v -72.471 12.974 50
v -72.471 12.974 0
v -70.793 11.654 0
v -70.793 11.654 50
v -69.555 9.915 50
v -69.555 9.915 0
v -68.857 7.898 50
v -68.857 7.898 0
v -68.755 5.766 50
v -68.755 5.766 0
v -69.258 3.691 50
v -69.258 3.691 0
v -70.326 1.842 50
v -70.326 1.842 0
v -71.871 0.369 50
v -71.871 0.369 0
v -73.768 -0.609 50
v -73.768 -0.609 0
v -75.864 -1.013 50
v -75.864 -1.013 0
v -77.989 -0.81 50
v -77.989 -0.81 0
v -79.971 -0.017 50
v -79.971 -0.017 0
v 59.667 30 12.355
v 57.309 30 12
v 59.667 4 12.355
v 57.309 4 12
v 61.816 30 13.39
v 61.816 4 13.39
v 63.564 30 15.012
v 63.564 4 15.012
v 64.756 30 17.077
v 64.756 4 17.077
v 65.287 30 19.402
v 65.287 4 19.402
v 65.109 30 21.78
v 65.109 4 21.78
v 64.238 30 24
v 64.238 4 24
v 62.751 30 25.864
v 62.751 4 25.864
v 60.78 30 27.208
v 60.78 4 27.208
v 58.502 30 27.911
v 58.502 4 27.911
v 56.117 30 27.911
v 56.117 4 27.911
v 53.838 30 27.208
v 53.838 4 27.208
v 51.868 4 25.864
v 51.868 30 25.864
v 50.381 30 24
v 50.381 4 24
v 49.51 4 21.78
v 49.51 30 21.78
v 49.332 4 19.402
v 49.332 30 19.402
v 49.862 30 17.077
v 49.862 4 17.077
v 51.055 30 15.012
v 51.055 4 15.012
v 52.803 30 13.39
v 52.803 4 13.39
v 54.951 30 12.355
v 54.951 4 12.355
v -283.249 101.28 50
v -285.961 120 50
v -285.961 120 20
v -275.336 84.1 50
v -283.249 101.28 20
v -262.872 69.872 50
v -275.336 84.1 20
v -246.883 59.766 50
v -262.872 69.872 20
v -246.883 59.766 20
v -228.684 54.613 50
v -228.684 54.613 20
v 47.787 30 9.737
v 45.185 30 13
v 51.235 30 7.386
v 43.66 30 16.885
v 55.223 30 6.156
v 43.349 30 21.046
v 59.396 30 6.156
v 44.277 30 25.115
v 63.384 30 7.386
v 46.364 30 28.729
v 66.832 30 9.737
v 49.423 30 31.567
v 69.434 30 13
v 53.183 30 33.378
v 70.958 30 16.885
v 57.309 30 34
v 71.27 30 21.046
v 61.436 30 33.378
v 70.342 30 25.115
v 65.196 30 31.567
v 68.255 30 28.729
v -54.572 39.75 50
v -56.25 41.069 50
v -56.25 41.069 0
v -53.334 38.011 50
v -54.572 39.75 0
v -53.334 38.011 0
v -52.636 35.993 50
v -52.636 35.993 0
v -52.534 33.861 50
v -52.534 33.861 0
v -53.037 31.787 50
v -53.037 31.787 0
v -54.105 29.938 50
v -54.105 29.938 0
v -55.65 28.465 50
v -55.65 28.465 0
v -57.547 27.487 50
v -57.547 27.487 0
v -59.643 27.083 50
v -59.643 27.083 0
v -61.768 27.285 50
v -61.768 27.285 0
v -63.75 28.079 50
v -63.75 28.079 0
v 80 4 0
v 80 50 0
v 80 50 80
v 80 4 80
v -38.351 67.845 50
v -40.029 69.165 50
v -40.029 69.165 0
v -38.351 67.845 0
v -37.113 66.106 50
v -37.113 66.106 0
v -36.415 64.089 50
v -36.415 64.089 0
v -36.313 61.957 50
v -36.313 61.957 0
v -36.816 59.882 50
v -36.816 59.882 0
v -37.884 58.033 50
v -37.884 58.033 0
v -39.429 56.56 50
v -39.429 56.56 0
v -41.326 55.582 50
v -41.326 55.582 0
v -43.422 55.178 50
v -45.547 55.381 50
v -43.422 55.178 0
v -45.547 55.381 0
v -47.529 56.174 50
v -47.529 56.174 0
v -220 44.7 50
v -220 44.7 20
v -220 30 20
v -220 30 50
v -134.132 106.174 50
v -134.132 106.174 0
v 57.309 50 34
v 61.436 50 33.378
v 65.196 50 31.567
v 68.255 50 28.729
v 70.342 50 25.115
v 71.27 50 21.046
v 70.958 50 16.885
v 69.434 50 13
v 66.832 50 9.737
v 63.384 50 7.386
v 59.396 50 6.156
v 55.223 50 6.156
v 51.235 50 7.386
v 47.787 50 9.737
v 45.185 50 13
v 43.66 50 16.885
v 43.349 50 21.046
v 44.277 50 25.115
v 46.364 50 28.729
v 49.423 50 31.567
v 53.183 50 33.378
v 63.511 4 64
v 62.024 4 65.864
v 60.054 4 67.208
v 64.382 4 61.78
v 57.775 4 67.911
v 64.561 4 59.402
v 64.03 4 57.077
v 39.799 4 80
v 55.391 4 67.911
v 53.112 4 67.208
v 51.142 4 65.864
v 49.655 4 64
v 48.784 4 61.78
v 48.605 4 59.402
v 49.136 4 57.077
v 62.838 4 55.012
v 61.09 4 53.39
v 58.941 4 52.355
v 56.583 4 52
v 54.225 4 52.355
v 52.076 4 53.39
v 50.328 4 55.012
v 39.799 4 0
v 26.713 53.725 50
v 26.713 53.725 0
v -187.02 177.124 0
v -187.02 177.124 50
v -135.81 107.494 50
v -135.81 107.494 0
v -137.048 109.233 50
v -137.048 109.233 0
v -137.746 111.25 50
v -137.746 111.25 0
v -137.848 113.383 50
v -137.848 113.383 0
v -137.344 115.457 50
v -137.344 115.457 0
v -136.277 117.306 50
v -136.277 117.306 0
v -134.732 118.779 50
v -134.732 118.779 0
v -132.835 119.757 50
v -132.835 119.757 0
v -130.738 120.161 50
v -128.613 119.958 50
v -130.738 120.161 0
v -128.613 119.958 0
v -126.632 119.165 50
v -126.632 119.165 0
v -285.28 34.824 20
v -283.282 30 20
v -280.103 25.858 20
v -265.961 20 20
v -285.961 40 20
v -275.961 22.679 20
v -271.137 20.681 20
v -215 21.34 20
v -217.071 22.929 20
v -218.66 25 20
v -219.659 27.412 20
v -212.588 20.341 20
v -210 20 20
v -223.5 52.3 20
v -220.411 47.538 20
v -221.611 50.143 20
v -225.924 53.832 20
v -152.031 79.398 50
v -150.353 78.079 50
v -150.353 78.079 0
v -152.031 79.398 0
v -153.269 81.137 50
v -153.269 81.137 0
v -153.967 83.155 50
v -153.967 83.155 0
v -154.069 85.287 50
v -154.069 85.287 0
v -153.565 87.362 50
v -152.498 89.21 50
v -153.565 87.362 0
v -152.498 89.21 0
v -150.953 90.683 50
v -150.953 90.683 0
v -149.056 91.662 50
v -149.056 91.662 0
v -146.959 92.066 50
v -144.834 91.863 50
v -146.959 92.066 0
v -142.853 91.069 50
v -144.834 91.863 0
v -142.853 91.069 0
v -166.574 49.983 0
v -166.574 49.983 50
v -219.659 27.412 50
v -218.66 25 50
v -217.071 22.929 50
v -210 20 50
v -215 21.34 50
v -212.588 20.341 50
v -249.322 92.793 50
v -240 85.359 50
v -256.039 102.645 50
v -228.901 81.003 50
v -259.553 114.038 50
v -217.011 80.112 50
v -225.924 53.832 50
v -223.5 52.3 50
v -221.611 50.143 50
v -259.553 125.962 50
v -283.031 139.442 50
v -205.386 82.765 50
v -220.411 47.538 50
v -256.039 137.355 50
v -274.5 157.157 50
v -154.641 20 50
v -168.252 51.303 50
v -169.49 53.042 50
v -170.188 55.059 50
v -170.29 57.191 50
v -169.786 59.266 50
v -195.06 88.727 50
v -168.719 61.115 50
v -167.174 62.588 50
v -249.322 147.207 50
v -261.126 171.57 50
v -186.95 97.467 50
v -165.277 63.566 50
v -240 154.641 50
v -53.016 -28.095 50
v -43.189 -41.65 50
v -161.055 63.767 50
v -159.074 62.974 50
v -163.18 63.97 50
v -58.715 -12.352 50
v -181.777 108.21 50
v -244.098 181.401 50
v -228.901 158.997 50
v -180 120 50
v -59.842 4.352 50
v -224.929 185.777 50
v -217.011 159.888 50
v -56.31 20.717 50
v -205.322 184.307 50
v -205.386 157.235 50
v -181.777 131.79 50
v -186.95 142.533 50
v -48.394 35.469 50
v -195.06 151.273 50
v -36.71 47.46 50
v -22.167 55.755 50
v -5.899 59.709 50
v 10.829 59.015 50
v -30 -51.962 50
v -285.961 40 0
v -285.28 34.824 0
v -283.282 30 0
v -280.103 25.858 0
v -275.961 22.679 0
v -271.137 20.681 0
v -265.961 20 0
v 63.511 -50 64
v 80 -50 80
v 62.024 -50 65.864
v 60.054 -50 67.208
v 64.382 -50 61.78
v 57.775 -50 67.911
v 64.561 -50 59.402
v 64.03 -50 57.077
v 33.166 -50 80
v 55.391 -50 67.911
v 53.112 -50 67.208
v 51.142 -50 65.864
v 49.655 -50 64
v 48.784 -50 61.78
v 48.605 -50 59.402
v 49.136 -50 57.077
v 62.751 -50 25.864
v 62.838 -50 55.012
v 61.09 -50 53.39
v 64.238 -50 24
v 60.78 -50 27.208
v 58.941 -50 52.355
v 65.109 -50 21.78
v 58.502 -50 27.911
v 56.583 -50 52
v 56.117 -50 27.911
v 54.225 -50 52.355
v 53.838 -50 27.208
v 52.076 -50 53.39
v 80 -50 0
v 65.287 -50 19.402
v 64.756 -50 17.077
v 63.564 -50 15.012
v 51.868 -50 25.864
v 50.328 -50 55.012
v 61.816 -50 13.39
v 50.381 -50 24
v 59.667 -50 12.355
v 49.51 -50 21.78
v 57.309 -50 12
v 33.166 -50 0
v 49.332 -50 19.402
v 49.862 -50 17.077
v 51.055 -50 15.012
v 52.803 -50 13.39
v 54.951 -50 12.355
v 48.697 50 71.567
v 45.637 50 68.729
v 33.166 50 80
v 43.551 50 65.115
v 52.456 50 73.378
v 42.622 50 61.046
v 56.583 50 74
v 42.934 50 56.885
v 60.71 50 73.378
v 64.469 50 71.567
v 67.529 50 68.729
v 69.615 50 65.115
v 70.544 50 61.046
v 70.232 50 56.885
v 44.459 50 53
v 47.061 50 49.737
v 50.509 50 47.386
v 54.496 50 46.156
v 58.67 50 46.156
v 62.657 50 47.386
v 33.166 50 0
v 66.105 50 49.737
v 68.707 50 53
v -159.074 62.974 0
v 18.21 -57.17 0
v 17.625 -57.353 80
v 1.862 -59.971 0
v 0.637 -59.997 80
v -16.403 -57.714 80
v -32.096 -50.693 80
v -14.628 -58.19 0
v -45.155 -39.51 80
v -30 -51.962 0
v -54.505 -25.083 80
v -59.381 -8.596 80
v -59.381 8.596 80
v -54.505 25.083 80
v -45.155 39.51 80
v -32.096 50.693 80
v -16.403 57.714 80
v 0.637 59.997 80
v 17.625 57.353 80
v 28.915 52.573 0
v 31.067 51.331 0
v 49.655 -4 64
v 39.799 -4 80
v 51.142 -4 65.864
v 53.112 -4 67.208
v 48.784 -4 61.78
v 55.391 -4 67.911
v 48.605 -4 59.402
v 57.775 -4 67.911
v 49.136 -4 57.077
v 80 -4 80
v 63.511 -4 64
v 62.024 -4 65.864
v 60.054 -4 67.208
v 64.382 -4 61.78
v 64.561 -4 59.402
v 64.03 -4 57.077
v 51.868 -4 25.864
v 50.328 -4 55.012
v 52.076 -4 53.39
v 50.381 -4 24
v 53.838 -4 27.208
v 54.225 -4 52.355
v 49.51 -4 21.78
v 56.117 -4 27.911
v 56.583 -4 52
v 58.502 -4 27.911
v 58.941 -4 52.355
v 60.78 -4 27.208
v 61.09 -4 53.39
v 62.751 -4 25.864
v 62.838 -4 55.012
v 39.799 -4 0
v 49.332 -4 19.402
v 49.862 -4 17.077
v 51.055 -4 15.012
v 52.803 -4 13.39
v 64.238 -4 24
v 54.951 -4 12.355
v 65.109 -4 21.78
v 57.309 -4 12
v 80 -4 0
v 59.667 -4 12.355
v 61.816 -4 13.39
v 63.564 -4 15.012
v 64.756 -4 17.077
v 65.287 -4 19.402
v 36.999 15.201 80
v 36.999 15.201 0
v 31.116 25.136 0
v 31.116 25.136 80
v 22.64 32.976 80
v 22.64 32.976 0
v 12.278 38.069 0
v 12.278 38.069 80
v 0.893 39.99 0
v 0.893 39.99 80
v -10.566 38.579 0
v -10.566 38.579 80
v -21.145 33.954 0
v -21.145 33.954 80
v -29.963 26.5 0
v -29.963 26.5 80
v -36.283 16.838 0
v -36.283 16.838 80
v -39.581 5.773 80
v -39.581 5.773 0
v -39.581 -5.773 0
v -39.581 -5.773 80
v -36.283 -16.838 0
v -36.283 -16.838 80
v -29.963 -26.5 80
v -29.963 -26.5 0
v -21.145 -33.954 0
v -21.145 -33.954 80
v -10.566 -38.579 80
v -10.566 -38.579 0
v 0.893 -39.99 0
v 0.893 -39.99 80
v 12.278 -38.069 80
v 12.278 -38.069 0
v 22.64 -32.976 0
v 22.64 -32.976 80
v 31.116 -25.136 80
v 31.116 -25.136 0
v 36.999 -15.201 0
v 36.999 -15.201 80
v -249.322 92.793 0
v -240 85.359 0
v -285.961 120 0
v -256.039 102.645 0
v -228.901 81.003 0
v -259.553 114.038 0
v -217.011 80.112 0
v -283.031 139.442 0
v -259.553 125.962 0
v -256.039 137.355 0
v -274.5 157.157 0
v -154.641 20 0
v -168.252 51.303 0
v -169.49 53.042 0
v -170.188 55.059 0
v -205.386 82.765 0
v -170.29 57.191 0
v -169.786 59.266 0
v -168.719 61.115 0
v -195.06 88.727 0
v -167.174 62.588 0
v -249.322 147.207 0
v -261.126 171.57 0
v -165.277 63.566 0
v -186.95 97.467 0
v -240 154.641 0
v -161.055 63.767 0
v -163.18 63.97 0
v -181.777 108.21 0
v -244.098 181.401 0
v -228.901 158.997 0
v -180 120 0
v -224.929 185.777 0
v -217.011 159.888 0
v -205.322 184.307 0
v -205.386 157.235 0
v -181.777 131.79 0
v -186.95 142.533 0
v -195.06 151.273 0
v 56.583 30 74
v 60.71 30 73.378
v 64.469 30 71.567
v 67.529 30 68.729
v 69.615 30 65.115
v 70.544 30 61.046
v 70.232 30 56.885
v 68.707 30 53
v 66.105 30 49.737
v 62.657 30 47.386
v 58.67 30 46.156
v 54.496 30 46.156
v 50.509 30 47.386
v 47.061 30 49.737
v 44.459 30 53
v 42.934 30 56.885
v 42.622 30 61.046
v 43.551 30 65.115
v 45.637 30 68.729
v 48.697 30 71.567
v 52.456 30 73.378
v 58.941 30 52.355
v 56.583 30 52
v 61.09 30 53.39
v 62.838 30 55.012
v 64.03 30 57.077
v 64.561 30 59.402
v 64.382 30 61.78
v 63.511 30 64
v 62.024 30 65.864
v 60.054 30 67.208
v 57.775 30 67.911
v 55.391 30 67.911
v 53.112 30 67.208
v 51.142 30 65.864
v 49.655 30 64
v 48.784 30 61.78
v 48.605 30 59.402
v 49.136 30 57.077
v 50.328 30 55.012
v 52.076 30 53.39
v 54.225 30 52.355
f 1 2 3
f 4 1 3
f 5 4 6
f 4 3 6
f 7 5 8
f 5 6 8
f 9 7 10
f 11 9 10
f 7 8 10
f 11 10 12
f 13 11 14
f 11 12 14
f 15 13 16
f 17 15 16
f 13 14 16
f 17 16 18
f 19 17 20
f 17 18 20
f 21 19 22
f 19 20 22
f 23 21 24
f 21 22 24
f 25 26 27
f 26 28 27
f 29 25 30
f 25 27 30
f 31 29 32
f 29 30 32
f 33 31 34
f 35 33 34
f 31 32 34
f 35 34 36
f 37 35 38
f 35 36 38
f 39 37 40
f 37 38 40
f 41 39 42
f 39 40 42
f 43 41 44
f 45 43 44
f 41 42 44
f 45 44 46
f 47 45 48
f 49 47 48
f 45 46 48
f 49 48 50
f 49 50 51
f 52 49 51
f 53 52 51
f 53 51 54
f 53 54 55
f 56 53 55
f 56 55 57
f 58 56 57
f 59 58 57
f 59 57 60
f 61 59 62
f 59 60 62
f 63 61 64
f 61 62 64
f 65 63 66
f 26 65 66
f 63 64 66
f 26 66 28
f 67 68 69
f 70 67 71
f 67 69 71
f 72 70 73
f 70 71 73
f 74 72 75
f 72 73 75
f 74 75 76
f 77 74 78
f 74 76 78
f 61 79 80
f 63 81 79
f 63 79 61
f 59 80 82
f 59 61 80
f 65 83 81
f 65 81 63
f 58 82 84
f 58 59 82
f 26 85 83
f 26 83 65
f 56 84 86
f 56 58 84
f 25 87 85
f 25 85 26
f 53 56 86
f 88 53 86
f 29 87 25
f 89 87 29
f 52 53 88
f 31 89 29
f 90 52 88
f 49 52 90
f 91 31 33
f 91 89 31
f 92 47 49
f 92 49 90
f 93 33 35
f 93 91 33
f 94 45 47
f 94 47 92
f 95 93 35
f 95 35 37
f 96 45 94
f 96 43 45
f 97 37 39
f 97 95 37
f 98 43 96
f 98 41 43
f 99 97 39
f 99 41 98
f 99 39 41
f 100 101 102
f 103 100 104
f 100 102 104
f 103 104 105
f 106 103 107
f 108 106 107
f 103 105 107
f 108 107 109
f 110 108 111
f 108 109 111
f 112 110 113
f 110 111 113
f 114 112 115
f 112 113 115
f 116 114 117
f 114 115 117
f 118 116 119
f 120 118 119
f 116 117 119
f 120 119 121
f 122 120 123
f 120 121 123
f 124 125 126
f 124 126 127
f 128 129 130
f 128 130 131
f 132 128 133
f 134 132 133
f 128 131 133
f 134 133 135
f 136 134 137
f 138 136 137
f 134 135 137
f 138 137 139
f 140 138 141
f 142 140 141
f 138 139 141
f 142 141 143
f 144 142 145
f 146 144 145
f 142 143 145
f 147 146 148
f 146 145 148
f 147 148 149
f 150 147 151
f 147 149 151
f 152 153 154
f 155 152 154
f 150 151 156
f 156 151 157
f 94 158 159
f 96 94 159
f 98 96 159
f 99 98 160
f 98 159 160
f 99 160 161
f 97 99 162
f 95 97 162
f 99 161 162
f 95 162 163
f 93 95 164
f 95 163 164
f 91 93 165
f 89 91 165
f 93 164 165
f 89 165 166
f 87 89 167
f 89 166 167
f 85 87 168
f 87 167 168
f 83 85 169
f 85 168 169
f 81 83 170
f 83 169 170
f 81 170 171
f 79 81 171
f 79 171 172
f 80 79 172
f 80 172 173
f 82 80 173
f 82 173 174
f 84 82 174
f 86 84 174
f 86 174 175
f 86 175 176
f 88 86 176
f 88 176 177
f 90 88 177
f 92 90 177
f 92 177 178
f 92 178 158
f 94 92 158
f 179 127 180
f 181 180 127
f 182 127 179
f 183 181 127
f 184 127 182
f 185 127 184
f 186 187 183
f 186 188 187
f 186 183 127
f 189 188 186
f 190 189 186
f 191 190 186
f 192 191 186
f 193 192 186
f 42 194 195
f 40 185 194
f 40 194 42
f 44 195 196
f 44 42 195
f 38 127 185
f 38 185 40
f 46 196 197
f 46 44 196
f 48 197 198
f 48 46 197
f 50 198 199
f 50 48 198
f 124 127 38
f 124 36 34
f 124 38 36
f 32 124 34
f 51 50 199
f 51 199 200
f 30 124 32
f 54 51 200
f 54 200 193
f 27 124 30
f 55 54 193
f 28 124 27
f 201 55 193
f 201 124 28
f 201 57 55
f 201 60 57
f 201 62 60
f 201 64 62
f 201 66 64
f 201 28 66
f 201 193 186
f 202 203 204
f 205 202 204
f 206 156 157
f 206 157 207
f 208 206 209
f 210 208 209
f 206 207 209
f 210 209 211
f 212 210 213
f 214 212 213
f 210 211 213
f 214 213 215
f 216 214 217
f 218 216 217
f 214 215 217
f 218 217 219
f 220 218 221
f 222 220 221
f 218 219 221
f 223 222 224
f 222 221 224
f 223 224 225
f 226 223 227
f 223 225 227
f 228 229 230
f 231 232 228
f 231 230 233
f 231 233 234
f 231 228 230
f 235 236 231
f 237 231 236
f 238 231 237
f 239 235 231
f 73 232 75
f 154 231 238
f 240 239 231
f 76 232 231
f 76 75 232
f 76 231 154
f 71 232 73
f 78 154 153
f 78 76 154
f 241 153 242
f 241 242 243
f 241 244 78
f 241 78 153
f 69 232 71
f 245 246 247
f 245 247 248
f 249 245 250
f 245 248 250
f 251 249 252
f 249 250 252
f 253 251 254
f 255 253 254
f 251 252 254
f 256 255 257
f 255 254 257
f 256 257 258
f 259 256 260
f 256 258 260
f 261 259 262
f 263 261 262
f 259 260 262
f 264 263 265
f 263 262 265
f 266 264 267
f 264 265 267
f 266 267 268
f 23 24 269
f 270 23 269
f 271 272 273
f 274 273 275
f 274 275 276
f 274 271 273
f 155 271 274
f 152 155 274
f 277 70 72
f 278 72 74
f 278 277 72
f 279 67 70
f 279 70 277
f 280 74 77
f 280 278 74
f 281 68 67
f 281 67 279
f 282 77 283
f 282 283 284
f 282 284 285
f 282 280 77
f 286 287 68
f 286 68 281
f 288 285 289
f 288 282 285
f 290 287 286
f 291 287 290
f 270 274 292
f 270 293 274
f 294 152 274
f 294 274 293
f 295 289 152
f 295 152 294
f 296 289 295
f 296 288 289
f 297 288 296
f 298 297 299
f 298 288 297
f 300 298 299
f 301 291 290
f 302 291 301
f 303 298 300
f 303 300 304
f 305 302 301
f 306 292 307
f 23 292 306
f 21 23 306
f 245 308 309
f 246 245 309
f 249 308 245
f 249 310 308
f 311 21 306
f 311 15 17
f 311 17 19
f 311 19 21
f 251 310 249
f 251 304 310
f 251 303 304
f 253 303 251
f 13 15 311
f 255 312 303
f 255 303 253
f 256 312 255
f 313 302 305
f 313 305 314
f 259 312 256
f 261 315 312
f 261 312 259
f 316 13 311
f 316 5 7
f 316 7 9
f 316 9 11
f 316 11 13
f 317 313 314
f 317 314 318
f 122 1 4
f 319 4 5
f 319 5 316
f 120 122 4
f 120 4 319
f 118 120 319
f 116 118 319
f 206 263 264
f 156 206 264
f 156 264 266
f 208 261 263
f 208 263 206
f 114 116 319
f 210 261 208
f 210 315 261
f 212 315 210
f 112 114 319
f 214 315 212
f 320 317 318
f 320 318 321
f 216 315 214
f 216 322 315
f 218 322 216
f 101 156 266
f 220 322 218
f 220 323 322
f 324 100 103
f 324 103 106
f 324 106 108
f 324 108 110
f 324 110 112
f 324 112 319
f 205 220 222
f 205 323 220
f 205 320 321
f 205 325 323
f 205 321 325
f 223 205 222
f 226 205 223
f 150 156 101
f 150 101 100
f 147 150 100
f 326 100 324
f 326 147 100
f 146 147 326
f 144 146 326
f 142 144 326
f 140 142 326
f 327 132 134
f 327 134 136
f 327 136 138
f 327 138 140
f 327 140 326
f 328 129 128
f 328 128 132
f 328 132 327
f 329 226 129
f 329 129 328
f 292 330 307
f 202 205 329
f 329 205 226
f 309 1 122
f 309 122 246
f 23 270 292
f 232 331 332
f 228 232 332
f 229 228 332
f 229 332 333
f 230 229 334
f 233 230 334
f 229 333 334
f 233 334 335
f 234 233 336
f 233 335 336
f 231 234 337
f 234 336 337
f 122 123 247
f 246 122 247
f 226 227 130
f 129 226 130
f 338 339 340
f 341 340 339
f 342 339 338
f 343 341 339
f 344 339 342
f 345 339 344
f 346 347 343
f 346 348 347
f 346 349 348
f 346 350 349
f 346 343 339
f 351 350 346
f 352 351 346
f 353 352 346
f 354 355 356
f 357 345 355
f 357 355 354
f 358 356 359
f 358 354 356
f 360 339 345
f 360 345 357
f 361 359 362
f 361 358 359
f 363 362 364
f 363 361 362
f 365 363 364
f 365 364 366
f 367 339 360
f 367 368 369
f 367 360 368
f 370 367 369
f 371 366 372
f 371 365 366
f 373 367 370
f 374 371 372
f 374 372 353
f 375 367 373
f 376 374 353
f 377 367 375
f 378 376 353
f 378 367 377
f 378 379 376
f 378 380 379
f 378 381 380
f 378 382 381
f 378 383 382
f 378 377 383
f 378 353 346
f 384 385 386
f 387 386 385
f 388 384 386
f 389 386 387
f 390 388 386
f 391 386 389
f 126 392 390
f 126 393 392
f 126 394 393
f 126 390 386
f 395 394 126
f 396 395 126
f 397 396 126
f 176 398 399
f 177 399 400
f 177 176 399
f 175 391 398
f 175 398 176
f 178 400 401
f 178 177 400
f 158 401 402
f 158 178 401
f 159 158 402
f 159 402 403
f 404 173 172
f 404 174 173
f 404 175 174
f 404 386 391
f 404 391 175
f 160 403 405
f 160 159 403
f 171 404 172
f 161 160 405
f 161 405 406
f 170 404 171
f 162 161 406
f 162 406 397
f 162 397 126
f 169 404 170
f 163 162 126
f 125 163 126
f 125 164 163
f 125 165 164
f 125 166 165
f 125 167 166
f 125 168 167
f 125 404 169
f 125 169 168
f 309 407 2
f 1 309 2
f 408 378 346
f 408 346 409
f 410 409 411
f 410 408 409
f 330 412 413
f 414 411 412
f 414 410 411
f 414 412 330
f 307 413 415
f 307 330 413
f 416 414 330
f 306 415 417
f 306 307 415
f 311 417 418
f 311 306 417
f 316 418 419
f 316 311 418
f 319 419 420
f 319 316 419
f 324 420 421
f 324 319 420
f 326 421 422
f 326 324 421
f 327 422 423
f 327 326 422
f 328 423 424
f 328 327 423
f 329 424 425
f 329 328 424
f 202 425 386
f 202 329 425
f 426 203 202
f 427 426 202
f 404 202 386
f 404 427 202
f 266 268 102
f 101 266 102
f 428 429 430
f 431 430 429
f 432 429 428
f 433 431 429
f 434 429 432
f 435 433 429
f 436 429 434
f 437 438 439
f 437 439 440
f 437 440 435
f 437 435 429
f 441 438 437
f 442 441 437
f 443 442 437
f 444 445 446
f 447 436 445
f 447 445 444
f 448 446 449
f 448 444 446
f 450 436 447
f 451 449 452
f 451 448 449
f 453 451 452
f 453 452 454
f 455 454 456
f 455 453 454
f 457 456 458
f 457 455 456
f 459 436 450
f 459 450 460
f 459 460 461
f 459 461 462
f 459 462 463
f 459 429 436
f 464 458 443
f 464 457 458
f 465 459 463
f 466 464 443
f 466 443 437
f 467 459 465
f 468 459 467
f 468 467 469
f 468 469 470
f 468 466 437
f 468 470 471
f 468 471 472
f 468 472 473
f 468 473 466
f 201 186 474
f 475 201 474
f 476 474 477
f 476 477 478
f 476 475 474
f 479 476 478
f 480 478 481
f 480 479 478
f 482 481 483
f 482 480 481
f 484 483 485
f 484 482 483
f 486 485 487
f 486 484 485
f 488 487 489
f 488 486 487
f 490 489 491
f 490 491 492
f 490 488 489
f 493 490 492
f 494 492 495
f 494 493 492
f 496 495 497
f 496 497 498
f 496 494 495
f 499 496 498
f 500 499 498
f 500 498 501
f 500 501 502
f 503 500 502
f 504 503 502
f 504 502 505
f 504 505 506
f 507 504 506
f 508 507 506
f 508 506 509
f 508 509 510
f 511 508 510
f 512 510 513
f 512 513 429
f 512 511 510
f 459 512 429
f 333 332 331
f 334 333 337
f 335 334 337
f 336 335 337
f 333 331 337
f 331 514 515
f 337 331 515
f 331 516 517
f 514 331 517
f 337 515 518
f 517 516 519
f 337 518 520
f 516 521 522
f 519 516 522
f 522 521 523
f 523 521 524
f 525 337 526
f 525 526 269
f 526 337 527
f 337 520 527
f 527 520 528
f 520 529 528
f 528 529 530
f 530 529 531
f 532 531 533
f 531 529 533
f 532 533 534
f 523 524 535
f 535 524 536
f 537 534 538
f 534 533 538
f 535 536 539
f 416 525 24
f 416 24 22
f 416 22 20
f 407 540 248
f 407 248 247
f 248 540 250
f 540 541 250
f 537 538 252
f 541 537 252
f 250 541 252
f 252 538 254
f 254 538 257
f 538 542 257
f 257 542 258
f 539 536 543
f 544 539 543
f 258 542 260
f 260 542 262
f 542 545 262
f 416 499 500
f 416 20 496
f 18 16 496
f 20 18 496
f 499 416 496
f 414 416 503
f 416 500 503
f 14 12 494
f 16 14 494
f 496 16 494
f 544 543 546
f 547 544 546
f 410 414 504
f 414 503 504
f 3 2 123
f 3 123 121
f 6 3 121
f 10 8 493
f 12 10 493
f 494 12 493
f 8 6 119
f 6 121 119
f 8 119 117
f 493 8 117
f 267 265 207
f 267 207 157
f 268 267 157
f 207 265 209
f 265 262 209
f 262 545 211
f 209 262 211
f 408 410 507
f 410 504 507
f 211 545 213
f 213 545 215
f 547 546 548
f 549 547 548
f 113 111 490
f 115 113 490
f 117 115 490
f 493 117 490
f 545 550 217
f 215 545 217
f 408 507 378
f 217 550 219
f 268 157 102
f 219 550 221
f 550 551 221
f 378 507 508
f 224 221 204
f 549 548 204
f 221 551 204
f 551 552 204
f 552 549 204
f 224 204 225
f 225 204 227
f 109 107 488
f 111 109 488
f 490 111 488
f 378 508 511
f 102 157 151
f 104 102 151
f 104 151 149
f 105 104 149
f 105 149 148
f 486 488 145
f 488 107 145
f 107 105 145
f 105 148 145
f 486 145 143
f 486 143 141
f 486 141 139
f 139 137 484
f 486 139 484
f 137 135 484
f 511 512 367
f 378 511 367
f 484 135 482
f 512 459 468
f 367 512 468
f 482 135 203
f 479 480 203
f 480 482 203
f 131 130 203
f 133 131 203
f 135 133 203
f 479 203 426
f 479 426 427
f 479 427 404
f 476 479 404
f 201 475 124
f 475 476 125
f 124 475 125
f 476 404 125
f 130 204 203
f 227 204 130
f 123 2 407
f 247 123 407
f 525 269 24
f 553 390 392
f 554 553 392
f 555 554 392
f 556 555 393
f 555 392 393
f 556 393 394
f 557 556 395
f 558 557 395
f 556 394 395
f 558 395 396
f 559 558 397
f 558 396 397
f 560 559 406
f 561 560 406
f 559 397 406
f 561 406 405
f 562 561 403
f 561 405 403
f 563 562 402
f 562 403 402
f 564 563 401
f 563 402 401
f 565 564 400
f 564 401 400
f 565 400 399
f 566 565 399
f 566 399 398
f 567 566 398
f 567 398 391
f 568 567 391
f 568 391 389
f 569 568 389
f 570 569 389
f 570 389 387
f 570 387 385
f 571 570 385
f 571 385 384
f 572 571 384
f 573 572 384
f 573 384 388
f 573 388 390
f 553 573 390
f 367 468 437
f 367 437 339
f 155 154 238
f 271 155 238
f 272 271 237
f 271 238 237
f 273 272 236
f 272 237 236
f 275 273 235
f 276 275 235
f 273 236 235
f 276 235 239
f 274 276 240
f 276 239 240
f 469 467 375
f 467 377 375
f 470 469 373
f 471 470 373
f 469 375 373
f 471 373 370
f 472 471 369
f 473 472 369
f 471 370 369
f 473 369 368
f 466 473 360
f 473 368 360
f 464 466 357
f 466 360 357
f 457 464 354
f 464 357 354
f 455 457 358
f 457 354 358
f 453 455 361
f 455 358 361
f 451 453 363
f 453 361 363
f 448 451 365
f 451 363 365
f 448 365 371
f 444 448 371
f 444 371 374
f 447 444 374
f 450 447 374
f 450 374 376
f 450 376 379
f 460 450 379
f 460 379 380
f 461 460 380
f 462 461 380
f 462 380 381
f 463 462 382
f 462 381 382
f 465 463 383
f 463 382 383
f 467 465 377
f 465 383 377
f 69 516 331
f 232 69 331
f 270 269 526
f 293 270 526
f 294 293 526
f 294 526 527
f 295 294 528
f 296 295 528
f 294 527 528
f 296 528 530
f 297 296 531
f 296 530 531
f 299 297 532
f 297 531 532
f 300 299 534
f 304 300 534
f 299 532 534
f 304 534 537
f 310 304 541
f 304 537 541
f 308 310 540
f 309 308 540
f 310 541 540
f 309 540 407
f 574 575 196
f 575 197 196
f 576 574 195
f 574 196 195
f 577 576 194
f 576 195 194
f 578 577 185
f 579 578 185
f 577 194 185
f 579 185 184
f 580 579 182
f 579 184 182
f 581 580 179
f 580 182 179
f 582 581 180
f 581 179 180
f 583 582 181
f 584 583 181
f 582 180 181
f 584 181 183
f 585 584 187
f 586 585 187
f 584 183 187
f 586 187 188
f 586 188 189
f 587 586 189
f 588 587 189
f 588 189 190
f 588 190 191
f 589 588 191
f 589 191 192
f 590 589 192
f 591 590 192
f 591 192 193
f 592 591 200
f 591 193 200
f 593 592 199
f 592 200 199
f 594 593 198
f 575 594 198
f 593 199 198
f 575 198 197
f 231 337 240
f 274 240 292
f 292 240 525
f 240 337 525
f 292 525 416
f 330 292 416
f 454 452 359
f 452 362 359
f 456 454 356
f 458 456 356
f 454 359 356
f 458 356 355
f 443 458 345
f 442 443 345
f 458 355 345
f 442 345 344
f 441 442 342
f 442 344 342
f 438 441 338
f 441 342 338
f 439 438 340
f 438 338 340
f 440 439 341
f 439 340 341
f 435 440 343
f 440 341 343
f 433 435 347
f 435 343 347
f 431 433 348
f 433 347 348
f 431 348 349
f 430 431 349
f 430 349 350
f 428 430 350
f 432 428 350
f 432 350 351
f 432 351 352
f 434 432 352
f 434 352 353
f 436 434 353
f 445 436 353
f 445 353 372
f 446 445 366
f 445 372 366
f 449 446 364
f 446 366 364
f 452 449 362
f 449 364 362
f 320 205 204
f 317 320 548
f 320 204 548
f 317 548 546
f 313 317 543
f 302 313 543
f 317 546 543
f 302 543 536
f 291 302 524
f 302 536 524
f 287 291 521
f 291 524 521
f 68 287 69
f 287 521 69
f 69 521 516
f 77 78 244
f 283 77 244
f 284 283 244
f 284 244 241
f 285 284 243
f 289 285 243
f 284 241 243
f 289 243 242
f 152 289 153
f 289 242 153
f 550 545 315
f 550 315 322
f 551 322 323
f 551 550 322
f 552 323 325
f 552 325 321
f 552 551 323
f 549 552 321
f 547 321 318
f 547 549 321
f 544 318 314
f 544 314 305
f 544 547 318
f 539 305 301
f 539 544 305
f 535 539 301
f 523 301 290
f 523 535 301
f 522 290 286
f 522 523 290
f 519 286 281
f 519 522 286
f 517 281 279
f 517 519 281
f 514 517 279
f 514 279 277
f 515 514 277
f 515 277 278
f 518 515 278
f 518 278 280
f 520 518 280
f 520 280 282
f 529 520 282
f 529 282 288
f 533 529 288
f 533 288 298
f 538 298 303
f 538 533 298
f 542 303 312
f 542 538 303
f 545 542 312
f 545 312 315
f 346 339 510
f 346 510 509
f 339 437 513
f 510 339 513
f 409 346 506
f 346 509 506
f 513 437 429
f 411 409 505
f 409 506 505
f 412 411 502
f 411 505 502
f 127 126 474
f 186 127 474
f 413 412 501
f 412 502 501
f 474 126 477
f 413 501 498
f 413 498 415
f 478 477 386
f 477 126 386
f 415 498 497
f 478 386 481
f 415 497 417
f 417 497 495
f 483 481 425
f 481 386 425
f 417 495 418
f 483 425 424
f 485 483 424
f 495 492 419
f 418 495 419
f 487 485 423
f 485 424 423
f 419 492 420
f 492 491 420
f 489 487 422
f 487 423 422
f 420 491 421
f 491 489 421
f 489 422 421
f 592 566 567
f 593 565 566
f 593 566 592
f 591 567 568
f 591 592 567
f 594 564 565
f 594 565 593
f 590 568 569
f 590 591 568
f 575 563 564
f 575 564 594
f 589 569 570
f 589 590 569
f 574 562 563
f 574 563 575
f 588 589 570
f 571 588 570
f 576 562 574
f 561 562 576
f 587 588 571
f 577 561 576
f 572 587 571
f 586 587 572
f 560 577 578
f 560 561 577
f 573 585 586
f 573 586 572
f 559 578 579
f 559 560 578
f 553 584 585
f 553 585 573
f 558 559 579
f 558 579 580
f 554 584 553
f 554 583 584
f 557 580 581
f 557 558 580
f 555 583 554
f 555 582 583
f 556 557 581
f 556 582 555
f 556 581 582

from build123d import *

# Parameters (mm, degrees)
CROQUIS1_R                                           = 40
SALIENTE_EXTRUIR2_DEPTH                              = 50
SALIENTE_EXTRUIR3_DEPTH                              = 80
SALIENTE_EXTRUIR4_DEPTH                              = 20
REFRENTADO_PARA_TORNILLO_CON_CABEZA_TRON_D           = 16
REFRENTADO_PARA_TORNILLO_CON_CABEZA_TRON_CBORE_D     = 28
REFRENTADO_PARA_TORNILLO_CON_CABEZA_TRON_CBORE_DEPTH = 20


with BuildPart() as part:
    # Croquis1 → Saliente-Extruir2 (new body)
    with BuildSketch(Plane.XY):
        with BuildLine():
            ThreePointArc((-187.0195, 177.123901659), (-252.9805, 177.123901659), (-285.961, 120))
            ThreePointArc((-285.961, 120), (-269.616671449, 76.536918708), (-228.683534972, 54.613076679))
            ThreePointArc((-228.683534972, 54.613076679), (-222.477877617, 51.289318393), (-220, 44.700109422))
            Line((-220, 44.700109422), (-220, 30))
            ThreePointArc((-220, 30), (-217.071067812, 22.928932188), (-210, 20))
            Line((-210, 20), (-154.641016151, 20))
            Line((-154.641016151, 20), (-30, -51.961524227))
            ThreePointArc((-30, -51.961524227), (-52.868956993, 28.370290561), (26.713161338, 53.725292101))
            Line((26.713161338, 53.725292101), (-187.0195, 177.123901659))
        make_face()
        with BuildLine():
            ThreePointArc((-72.471012114, 12.973644893), (-69.725821585, 2.728454364), (-79.971012114, -0.016736164))
            Line((-79.971012114, -0.016736164), (-166.573552492, 49.983263836))
            ThreePointArc((-166.573552492, 49.983263836), (-169.31874302, 60.228454364), (-159.073552492, 62.973644893))
            Line((-159.073552492, 62.973644893), (-72.471012114, 12.973644893))
        make_face(mode=Mode.SUBTRACT)
        with BuildLine():
            ThreePointArc((-56.25, 41.069262024), (-53.504809472, 30.824071495), (-63.75, 28.078880967))
            Line((-63.75, 28.078880967), (-150.352540378, 78.078880967))
            ThreePointArc((-150.352540378, 78.078880967), (-153.097730907, 88.324071495), (-142.852540378, 91.069262024))
            Line((-142.852540378, 91.069262024), (-56.25, 41.069262024))
        make_face(mode=Mode.SUBTRACT)
        with Locations((-220, 120)):
            Circle(CROQUIS1_R, mode=Mode.SUBTRACT)
        with BuildLine():
            ThreePointArc((-40.028987886, 69.164879154), (-37.283797358, 58.919688626), (-47.528987886, 56.174498098))
            Line((-47.528987886, 56.174498098), (-134.131528265, 106.174498098))
            ThreePointArc((-134.131528265, 106.174498098), (-136.876718793, 116.419688626), (-126.631528265, 119.164879154))
            Line((-126.631528265, 119.164879154), (-40.028987886, 69.164879154))
        make_face(mode=Mode.SUBTRACT)
    extrude(amount=SALIENTE_EXTRUIR2_DEPTH)

    # Croquis1<4> → Saliente-Extruir3 (add)
    with BuildSketch(Plane.XY):
        with BuildLine():
            ThreePointArc((33.166247904, 50), (29.997589288, 51.962915978), (26.713161338, 53.725292101))
            ThreePointArc((26.713161338, 53.725292101), (-52.868956993, 28.370290561), (-30, -51.961524227))
            ThreePointArc((-30, -51.961524227), (1.862303888, -59.971091571), (33.166247904, -50))
            Line((33.166247904, -50), (80, -50))
            Line((80, -50), (80, -4))
            Line((80, -4), (39.799497484, -4))
            ThreePointArc((39.799497484, -4), (-40, 0), (39.799497484, 4))
            Line((39.799497484, 4), (80, 4))
            Line((80, 4), (80, 50))
            Line((80, 50), (33.166247904, 50))
        make_face()
    extrude(amount=SALIENTE_EXTRUIR3_DEPTH)

    # Croquis1<5> → Saliente-Extruir4 (add)
    with BuildSketch(Plane.XY):
        with BuildLine():
            ThreePointArc((-228.683534972, 54.613076679), (-269.616671449, 76.536918708), (-285.961, 120))
            Line((-285.961, 120), (-285.961, 40))
            ThreePointArc((-285.961, 40), (-280.103135624, 25.857864376), (-265.961, 20))
            Line((-265.961, 20), (-210, 20))
            ThreePointArc((-210, 20), (-217.071067812, 22.928932188), (-220, 30))
            Line((-220, 30), (-220, 44.700109422))
            ThreePointArc((-220, 44.700109422), (-222.477877617, 51.289318393), (-228.683534972, 54.613076679))
        make_face()
    extrude(amount=SALIENTE_EXTRUIR4_DEPTH)

    # Refrentado para tornillo con cabeza troncocónica de M52 (through all)
    with Locations(Plane(origin=(56.583, 50, 60), x_dir=(0, 0, 1), z_dir=(0, 1, 0))):
        with Locations((0, 0), (-40, 0.726384558)):
            CounterBoreHole(REFRENTADO_PARA_TORNILLO_CON_CABEZA_TRON_D / 2, REFRENTADO_PARA_TORNILLO_CON_CABEZA_TRON_CBORE_D / 2, REFRENTADO_PARA_TORNILLO_CON_CABEZA_TRON_CBORE_DEPTH)


solid = part.part
